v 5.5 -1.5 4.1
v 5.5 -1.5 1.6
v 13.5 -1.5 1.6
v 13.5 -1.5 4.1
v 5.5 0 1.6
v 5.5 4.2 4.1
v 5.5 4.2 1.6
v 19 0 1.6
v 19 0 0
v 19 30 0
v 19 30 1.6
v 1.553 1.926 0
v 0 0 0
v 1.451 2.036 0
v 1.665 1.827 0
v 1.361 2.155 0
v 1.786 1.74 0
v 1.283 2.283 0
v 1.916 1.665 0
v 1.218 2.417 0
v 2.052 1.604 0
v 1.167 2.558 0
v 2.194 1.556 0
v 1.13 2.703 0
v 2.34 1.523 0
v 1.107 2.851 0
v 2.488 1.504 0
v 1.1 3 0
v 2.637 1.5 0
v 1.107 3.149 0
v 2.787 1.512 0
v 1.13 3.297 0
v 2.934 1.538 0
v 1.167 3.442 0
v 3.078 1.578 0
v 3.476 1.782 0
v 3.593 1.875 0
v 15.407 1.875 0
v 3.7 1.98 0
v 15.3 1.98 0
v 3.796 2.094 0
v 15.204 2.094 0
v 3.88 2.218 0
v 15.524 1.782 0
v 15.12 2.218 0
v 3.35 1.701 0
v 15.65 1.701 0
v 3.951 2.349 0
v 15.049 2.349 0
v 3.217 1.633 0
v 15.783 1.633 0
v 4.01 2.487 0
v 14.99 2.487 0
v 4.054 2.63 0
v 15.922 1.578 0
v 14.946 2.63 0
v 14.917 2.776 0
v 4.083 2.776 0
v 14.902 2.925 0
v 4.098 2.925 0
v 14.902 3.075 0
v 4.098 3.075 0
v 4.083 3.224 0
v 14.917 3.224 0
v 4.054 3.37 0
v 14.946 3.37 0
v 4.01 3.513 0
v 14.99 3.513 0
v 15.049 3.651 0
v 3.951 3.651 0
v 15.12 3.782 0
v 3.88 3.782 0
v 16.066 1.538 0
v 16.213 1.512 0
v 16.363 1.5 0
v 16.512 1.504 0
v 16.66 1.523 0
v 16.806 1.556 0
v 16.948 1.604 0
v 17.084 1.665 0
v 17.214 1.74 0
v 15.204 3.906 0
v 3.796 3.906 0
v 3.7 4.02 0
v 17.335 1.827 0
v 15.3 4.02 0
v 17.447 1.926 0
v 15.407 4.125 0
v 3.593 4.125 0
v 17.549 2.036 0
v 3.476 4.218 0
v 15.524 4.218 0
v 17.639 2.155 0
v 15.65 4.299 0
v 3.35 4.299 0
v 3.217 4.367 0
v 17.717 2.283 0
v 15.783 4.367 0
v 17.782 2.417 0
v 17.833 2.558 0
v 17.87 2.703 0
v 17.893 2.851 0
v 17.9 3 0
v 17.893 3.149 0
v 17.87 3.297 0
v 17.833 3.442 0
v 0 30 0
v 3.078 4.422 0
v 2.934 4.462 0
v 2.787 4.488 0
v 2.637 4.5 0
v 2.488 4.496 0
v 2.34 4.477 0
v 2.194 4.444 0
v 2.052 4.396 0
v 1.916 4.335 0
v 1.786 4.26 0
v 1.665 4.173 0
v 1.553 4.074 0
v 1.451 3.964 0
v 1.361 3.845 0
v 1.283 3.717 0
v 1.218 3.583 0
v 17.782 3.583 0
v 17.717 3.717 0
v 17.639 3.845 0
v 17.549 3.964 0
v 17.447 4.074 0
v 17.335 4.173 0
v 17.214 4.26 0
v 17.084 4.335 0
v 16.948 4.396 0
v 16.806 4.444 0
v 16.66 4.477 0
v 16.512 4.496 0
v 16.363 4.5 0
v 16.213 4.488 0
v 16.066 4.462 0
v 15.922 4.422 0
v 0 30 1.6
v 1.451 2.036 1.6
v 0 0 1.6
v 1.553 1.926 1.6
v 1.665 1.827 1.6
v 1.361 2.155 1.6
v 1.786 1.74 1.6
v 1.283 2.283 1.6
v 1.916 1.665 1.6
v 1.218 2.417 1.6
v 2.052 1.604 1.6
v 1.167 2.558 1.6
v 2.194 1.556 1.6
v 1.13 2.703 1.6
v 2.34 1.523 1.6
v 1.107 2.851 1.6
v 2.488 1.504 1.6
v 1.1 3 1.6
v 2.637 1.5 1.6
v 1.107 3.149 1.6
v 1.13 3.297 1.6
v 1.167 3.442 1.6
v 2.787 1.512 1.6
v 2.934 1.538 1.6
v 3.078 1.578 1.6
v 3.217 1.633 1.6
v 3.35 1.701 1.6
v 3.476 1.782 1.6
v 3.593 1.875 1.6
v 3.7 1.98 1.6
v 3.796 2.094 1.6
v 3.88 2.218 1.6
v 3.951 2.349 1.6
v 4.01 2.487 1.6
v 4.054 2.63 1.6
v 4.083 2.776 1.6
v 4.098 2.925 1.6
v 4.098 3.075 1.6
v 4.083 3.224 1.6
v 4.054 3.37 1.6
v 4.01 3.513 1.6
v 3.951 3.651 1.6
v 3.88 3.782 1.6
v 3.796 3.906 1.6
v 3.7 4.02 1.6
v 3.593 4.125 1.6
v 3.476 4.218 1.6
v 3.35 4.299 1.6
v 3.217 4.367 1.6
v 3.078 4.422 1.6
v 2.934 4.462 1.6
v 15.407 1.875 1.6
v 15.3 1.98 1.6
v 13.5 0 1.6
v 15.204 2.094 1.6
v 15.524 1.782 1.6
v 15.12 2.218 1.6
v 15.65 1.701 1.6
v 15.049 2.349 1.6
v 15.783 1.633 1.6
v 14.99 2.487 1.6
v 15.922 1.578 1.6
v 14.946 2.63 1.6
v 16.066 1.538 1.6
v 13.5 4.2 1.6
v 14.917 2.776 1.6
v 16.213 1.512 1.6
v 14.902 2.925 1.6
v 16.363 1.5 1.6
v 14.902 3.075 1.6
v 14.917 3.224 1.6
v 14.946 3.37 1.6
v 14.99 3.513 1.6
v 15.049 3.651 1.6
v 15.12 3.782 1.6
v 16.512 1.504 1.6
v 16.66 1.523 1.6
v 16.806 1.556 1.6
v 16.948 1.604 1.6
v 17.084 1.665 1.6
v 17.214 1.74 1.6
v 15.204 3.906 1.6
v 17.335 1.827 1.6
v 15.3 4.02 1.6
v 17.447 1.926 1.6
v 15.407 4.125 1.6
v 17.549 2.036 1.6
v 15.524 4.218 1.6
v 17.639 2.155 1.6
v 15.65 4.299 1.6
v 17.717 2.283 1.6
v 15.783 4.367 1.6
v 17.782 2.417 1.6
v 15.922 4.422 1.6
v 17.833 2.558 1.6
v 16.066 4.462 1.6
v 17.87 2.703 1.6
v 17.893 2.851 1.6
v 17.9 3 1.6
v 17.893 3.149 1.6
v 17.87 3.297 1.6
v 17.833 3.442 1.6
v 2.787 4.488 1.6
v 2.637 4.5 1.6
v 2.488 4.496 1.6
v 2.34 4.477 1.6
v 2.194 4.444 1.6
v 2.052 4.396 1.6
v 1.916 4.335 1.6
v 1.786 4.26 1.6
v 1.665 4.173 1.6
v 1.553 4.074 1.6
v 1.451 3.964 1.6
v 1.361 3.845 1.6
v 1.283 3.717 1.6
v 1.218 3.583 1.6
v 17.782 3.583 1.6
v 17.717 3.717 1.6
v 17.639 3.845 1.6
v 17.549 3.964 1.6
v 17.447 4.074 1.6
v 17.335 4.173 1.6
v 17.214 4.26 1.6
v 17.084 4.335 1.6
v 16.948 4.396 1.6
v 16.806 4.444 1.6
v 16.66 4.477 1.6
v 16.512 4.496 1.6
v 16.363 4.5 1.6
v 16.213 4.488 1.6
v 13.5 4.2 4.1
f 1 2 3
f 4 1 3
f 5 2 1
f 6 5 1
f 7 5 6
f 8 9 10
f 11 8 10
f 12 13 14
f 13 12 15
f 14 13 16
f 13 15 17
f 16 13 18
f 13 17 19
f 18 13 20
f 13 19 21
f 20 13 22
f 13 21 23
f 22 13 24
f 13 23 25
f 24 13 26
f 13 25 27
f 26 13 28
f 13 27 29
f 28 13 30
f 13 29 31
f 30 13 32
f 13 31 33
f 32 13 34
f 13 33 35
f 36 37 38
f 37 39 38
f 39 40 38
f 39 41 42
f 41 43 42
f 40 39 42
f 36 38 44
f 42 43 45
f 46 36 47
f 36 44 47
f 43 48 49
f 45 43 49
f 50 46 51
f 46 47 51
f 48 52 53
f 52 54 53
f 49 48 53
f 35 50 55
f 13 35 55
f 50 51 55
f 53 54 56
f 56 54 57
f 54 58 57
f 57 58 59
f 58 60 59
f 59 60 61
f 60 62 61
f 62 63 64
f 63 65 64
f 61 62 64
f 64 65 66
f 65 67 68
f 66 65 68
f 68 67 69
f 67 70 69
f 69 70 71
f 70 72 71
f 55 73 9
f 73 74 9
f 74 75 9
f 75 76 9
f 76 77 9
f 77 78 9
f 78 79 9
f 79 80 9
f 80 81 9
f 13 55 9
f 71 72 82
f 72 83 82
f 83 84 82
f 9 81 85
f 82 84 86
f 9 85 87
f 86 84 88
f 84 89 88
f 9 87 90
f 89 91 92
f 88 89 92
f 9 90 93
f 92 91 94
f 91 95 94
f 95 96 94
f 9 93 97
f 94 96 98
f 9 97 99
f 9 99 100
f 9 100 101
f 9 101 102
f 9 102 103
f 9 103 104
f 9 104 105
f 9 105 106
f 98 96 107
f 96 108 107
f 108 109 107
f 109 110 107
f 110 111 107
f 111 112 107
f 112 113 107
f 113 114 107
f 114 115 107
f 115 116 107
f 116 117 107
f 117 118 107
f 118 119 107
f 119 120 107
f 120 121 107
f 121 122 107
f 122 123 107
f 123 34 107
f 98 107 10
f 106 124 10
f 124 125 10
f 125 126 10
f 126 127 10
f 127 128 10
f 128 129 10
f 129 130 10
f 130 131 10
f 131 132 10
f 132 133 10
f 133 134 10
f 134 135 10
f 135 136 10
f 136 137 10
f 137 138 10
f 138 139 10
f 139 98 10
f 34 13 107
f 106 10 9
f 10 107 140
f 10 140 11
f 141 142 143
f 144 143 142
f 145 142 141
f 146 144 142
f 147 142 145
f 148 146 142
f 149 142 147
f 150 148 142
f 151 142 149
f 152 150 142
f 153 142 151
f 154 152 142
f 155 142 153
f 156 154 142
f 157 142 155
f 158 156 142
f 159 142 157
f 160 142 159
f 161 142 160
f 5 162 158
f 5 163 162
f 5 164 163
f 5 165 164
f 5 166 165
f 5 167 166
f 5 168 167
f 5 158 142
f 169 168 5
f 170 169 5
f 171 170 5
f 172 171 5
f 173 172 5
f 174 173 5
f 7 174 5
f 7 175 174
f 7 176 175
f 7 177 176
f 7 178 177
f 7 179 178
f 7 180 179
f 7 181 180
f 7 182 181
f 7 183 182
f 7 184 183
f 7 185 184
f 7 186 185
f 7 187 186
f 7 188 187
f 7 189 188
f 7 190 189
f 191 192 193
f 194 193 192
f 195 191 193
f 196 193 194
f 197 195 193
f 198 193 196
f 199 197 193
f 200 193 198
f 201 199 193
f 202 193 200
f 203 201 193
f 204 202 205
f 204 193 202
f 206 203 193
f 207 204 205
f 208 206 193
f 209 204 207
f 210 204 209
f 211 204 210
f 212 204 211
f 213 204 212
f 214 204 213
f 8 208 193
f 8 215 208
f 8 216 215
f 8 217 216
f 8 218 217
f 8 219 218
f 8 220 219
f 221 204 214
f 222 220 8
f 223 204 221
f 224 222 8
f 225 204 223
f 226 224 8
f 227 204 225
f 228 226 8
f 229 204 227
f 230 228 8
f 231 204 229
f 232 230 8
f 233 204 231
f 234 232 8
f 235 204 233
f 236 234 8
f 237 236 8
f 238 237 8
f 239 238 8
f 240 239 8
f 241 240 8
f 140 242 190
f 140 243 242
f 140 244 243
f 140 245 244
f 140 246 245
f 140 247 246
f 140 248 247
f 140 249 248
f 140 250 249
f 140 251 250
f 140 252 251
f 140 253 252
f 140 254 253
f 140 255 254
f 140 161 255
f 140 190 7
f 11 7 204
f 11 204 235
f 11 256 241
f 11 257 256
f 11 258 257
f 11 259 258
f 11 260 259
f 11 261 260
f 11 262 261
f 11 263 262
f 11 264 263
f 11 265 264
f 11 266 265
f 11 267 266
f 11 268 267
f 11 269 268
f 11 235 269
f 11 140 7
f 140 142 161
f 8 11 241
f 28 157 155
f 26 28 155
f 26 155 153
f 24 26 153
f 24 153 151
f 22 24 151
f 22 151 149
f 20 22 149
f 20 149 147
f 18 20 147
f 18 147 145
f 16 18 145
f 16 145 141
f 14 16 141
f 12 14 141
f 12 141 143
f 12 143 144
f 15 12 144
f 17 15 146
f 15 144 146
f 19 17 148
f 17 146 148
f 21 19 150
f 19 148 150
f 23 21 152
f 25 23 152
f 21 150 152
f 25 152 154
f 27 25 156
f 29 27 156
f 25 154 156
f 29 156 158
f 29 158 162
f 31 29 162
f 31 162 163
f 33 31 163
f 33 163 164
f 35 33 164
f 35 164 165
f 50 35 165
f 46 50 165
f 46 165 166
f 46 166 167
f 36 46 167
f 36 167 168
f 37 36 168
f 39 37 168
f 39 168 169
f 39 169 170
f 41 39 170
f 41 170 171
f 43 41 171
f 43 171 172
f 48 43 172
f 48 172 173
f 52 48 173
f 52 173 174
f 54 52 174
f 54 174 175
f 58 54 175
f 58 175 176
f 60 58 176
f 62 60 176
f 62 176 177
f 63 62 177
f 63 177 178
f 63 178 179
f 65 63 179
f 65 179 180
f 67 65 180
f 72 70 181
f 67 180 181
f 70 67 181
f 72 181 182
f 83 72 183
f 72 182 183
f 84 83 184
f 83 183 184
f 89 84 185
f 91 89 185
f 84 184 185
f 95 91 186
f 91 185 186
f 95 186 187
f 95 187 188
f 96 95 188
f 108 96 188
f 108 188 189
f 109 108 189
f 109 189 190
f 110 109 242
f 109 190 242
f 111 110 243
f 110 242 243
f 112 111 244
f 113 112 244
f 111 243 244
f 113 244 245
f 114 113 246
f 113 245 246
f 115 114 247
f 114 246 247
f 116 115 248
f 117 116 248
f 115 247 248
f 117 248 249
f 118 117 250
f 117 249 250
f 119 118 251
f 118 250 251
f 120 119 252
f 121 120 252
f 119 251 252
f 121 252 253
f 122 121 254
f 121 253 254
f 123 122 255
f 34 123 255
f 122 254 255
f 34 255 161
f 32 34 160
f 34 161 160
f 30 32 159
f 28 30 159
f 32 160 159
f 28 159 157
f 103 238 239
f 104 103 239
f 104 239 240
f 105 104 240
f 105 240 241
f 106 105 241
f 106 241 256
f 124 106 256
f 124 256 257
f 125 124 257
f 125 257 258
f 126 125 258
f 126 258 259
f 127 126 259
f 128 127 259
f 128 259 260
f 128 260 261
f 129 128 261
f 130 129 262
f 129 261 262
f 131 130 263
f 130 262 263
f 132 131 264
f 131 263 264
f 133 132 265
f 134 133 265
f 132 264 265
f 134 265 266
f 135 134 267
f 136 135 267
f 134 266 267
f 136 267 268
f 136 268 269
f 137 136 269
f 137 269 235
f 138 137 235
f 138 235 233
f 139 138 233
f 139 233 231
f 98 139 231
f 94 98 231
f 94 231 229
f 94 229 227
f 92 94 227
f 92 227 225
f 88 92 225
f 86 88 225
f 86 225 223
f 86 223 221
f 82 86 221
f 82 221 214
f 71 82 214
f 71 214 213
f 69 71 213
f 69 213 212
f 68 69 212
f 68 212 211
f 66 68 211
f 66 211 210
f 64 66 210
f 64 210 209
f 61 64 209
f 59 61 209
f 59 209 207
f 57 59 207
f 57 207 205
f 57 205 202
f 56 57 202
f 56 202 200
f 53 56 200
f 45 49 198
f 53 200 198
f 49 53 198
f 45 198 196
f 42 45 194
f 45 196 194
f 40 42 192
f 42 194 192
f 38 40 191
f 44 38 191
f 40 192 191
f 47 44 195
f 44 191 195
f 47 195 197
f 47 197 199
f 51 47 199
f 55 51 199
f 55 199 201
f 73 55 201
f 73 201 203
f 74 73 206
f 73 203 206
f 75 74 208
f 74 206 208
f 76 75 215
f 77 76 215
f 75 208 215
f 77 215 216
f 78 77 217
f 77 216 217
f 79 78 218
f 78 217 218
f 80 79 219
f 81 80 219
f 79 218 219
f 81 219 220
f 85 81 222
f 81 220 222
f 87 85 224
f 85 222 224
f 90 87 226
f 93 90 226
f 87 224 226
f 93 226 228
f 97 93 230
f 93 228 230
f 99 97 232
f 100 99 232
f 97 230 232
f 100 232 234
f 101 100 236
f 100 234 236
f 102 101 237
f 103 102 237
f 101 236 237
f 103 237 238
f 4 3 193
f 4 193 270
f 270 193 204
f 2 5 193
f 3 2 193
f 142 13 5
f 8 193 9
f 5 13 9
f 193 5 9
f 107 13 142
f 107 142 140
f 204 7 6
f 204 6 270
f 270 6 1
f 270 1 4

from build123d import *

# Parameters (mm, degrees)
ESQUISSE1_W             = 19
ESQUISSE1_H             = 30
BOSS_EXTRU_1_DEPTH      = 1.6
ESQUISSE2_W             = 8
ESQUISSE2_H             = 5.7
BOSS_EXTRU_2_DEPTH      = 2.5
ENL_V_MAT_EXTRU_1_REACH = 37.598
ESQUISSE3_R             = 1.5


with BuildPart() as part:
    # Esquisse1 → Boss.-Extru.1 (new body)
    with BuildSketch(Plane.XY):
        with Locations((9.5, 15)):
            Rectangle(ESQUISSE1_W, ESQUISSE1_H)
    extrude(amount=BOSS_EXTRU_1_DEPTH)

    # Esquisse2 → Boss.-Extru.2 (add)
    with BuildSketch(Plane.XY.offset(1.6)):
        with Locations((9.5, 1.35)):
            Rectangle(ESQUISSE2_W, ESQUISSE2_H)
    extrude(amount=BOSS_EXTRU_2_DEPTH)

    # Esquisse3 → Enlèv. mat.-Extru.1 (cut, up to next)
    with BuildSketch(Plane.XY.offset(1.6), mode=Mode.PRIVATE) as enl_v_mat_extru_1_sk1:
        with Locations((16.4, 3)):
            Circle(ESQUISSE3_R)
    enl_v_mat_extru_1_tool1 = extrude(enl_v_mat_extru_1_sk1.sketch, amount=-ENL_V_MAT_EXTRU_1_REACH, mode=Mode.PRIVATE) & part.part
    # Esquisse3 → Enlèv. mat.-Extru.1 (cut, up to next)
    with BuildSketch(Plane.XY.offset(1.6), mode=Mode.PRIVATE) as enl_v_mat_extru_1_sk2:
        with Locations(Location((2.6, 3, 0), (0, 0, 180))):
            Circle(ESQUISSE3_R)
    enl_v_mat_extru_1_tool2 = extrude(enl_v_mat_extru_1_sk2.sketch, amount=-ENL_V_MAT_EXTRU_1_REACH, mode=Mode.PRIVATE) & part.part
    add(enl_v_mat_extru_1_tool1.solids().sort_by_distance((16.4, 3, 1.6))[0], mode=Mode.SUBTRACT)
    add(enl_v_mat_extru_1_tool2.solids().sort_by_distance((2.6, 3, 1.6))[0], mode=Mode.SUBTRACT)


solid = part.part
